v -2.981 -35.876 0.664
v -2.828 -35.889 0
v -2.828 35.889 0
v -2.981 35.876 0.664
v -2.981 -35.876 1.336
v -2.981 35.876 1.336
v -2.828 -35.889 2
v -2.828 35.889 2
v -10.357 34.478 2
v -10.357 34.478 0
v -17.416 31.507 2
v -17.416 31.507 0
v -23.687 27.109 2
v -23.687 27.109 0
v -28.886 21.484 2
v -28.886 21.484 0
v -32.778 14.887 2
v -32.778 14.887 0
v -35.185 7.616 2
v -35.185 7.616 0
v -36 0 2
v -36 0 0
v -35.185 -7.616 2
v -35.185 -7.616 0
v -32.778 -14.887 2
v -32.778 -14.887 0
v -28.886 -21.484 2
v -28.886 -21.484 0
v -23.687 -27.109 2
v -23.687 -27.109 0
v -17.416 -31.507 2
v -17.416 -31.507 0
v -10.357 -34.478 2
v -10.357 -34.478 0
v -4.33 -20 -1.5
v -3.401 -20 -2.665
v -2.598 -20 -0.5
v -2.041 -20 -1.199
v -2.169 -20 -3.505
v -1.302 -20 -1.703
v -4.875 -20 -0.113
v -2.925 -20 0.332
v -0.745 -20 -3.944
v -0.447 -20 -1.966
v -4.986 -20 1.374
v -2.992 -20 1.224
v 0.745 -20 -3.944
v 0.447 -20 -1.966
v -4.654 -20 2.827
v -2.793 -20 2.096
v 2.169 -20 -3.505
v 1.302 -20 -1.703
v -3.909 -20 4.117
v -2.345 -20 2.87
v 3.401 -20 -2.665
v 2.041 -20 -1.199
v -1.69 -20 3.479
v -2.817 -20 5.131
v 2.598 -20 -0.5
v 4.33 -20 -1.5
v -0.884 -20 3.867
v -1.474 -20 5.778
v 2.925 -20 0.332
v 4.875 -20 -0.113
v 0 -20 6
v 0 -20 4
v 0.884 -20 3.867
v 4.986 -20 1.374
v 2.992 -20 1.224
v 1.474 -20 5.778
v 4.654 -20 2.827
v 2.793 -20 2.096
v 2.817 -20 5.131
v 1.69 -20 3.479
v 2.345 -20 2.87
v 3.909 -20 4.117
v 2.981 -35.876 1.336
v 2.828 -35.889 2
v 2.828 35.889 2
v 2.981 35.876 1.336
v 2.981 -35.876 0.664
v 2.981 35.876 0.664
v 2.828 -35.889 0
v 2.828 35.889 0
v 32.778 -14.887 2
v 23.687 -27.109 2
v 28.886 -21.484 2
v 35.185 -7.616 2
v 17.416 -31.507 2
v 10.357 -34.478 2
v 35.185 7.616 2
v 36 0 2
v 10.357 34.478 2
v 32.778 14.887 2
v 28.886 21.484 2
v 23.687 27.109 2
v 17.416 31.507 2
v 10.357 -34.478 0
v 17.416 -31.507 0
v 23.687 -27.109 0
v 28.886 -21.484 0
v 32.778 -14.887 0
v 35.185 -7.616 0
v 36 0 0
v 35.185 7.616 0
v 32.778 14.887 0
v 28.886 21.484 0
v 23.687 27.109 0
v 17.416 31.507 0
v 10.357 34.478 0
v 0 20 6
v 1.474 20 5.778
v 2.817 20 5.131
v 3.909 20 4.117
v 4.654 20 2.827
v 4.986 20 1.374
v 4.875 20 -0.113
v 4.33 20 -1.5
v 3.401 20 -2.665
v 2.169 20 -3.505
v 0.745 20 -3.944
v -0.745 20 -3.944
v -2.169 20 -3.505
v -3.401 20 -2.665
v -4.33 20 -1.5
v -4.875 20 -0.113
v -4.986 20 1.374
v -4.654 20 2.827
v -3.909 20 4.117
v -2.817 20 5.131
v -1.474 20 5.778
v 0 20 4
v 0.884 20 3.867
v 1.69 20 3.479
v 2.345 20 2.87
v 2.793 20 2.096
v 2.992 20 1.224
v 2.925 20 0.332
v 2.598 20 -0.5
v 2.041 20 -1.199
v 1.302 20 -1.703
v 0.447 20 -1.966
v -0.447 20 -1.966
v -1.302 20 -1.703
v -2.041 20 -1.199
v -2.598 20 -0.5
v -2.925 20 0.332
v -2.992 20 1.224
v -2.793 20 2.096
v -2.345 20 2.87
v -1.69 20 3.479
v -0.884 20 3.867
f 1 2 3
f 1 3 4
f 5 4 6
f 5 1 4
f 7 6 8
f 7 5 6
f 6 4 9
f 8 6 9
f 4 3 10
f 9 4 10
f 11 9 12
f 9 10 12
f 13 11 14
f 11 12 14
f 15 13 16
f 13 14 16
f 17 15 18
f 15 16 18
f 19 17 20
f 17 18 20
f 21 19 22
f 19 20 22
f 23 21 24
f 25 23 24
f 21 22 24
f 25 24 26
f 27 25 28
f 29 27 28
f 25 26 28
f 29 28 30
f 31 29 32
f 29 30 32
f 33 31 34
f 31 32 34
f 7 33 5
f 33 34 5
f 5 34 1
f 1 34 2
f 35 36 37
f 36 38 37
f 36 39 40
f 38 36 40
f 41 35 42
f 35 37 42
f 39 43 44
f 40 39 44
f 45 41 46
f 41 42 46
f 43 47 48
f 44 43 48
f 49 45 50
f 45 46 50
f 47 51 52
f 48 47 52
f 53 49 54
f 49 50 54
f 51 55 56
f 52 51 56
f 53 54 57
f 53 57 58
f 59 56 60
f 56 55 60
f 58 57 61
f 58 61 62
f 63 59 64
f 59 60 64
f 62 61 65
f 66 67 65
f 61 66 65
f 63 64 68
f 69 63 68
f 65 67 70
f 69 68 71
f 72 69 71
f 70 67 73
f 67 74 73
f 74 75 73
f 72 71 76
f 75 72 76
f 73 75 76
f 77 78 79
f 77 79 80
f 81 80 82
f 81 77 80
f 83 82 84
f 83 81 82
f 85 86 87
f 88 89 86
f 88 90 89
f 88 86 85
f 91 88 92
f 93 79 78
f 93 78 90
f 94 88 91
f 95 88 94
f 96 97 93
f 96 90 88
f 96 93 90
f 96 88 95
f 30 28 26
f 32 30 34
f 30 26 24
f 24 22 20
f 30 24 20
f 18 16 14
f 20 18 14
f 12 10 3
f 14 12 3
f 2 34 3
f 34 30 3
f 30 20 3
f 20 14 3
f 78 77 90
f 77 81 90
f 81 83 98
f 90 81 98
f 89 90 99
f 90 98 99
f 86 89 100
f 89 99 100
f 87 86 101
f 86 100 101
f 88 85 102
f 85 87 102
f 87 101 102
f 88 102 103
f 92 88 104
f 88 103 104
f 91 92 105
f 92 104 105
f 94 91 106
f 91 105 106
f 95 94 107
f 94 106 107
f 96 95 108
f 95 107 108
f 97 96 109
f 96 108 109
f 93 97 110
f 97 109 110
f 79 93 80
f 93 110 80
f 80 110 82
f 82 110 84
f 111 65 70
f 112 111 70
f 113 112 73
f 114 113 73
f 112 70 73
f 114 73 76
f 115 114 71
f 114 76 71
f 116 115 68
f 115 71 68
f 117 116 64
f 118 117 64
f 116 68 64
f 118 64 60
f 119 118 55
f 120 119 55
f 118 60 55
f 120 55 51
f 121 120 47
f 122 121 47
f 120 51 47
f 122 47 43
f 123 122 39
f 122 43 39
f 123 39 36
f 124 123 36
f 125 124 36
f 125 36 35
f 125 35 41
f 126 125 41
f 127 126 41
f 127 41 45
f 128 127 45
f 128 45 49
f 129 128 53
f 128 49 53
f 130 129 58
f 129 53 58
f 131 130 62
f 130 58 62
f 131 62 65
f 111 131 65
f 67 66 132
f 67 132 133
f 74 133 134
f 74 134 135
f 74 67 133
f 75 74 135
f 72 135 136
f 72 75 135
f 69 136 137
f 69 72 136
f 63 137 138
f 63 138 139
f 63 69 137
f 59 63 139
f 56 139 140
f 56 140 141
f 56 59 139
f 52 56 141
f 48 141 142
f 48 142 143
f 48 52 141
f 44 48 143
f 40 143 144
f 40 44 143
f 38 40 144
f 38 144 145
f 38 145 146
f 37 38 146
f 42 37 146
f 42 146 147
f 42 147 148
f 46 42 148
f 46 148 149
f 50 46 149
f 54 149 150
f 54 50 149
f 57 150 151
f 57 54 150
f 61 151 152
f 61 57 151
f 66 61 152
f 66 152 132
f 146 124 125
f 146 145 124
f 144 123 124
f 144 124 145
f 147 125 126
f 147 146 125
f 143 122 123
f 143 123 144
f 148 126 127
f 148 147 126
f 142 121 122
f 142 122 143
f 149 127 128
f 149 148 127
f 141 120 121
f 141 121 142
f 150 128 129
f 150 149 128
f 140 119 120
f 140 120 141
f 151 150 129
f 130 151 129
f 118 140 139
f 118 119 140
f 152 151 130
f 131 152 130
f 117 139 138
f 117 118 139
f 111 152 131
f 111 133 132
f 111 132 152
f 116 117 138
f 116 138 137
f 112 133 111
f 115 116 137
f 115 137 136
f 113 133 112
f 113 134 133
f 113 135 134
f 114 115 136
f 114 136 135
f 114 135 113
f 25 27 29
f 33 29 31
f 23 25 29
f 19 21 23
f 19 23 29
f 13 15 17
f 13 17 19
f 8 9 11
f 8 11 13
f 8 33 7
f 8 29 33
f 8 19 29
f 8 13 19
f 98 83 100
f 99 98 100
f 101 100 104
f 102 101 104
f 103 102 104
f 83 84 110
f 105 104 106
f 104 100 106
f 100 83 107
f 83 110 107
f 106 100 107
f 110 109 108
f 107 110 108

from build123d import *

# Parameters (mm, degrees)
SKETCH1_R                = 36
BOSS_EXTRUDE1_DEPTH      = 2
BOSS_EXTRUDE2_DEPTH      = 20.0001
BOSS_EXTRUDE2_DEPTH_BACK = 20
SKETCH2_R                = 5
SKETCH2_R_2              = 3
CUT_EXTRUDE1_DEPTH       = 20
CUT_EXTRUDE1_DEPTH_BACK  = 67.843183647
SKETCH3_R                = 3


with BuildPart() as part:
    # Sketch1 → Boss-Extrude1 (new body)
    with BuildSketch(Plane.XY):
        Circle(SKETCH1_R)
    extrude(amount=BOSS_EXTRUDE1_DEPTH)

    # Sketch3 → Cut-Extrude1 (cut, two sides: drawn at the far end of the back side and taken through both)
    with BuildSketch(Plane(origin=(0, 20.0001, 0), x_dir=(1, 0, 0), z_dir=(0, 1, 0)).offset(-CUT_EXTRUDE1_DEPTH_BACK)):
        with Locations((0, -1)):
            Circle(SKETCH3_R)
    extrude(amount=CUT_EXTRUDE1_DEPTH + CUT_EXTRUDE1_DEPTH_BACK, mode=Mode.SUBTRACT)


with BuildPart() as body_2:
    # Sketch2 → Boss-Extrude2 (new, two sides: drawn at the far end of the back side and taken through both)
    with BuildSketch(Plane(origin=(0, 0, 0), x_dir=(1, 0, 0), z_dir=(0, 1, 0)).offset(-BOSS_EXTRUDE2_DEPTH_BACK)):
        with Locations((0, -1)):
            Circle(SKETCH2_R)
        with Locations((0, -1)):
            Circle(SKETCH2_R_2, mode=Mode.SUBTRACT)
    extrude(amount=BOSS_EXTRUDE2_DEPTH + BOSS_EXTRUDE2_DEPTH_BACK)


with BuildPart() as cut_extrude1_piece_1:
    # of the separate pieces the step leaves, piece 1, a body of its own (cut_extrude1_pieces)
    add(part.part.solids().sort_by_distance((2.828427125, -35.88871689, 0))[0])


with BuildPart() as cut_extrude1_piece_2:
    # of the separate pieces the step leaves, piece 2, a body of its own (cut_extrude1_pieces)
    add(part.part.solids().sort_by_distance((-2.828427125, 35.88871689, 0))[0])


solid = Compound([body_2.part, cut_extrude1_piece_1.part, cut_extrude1_piece_2.part])
